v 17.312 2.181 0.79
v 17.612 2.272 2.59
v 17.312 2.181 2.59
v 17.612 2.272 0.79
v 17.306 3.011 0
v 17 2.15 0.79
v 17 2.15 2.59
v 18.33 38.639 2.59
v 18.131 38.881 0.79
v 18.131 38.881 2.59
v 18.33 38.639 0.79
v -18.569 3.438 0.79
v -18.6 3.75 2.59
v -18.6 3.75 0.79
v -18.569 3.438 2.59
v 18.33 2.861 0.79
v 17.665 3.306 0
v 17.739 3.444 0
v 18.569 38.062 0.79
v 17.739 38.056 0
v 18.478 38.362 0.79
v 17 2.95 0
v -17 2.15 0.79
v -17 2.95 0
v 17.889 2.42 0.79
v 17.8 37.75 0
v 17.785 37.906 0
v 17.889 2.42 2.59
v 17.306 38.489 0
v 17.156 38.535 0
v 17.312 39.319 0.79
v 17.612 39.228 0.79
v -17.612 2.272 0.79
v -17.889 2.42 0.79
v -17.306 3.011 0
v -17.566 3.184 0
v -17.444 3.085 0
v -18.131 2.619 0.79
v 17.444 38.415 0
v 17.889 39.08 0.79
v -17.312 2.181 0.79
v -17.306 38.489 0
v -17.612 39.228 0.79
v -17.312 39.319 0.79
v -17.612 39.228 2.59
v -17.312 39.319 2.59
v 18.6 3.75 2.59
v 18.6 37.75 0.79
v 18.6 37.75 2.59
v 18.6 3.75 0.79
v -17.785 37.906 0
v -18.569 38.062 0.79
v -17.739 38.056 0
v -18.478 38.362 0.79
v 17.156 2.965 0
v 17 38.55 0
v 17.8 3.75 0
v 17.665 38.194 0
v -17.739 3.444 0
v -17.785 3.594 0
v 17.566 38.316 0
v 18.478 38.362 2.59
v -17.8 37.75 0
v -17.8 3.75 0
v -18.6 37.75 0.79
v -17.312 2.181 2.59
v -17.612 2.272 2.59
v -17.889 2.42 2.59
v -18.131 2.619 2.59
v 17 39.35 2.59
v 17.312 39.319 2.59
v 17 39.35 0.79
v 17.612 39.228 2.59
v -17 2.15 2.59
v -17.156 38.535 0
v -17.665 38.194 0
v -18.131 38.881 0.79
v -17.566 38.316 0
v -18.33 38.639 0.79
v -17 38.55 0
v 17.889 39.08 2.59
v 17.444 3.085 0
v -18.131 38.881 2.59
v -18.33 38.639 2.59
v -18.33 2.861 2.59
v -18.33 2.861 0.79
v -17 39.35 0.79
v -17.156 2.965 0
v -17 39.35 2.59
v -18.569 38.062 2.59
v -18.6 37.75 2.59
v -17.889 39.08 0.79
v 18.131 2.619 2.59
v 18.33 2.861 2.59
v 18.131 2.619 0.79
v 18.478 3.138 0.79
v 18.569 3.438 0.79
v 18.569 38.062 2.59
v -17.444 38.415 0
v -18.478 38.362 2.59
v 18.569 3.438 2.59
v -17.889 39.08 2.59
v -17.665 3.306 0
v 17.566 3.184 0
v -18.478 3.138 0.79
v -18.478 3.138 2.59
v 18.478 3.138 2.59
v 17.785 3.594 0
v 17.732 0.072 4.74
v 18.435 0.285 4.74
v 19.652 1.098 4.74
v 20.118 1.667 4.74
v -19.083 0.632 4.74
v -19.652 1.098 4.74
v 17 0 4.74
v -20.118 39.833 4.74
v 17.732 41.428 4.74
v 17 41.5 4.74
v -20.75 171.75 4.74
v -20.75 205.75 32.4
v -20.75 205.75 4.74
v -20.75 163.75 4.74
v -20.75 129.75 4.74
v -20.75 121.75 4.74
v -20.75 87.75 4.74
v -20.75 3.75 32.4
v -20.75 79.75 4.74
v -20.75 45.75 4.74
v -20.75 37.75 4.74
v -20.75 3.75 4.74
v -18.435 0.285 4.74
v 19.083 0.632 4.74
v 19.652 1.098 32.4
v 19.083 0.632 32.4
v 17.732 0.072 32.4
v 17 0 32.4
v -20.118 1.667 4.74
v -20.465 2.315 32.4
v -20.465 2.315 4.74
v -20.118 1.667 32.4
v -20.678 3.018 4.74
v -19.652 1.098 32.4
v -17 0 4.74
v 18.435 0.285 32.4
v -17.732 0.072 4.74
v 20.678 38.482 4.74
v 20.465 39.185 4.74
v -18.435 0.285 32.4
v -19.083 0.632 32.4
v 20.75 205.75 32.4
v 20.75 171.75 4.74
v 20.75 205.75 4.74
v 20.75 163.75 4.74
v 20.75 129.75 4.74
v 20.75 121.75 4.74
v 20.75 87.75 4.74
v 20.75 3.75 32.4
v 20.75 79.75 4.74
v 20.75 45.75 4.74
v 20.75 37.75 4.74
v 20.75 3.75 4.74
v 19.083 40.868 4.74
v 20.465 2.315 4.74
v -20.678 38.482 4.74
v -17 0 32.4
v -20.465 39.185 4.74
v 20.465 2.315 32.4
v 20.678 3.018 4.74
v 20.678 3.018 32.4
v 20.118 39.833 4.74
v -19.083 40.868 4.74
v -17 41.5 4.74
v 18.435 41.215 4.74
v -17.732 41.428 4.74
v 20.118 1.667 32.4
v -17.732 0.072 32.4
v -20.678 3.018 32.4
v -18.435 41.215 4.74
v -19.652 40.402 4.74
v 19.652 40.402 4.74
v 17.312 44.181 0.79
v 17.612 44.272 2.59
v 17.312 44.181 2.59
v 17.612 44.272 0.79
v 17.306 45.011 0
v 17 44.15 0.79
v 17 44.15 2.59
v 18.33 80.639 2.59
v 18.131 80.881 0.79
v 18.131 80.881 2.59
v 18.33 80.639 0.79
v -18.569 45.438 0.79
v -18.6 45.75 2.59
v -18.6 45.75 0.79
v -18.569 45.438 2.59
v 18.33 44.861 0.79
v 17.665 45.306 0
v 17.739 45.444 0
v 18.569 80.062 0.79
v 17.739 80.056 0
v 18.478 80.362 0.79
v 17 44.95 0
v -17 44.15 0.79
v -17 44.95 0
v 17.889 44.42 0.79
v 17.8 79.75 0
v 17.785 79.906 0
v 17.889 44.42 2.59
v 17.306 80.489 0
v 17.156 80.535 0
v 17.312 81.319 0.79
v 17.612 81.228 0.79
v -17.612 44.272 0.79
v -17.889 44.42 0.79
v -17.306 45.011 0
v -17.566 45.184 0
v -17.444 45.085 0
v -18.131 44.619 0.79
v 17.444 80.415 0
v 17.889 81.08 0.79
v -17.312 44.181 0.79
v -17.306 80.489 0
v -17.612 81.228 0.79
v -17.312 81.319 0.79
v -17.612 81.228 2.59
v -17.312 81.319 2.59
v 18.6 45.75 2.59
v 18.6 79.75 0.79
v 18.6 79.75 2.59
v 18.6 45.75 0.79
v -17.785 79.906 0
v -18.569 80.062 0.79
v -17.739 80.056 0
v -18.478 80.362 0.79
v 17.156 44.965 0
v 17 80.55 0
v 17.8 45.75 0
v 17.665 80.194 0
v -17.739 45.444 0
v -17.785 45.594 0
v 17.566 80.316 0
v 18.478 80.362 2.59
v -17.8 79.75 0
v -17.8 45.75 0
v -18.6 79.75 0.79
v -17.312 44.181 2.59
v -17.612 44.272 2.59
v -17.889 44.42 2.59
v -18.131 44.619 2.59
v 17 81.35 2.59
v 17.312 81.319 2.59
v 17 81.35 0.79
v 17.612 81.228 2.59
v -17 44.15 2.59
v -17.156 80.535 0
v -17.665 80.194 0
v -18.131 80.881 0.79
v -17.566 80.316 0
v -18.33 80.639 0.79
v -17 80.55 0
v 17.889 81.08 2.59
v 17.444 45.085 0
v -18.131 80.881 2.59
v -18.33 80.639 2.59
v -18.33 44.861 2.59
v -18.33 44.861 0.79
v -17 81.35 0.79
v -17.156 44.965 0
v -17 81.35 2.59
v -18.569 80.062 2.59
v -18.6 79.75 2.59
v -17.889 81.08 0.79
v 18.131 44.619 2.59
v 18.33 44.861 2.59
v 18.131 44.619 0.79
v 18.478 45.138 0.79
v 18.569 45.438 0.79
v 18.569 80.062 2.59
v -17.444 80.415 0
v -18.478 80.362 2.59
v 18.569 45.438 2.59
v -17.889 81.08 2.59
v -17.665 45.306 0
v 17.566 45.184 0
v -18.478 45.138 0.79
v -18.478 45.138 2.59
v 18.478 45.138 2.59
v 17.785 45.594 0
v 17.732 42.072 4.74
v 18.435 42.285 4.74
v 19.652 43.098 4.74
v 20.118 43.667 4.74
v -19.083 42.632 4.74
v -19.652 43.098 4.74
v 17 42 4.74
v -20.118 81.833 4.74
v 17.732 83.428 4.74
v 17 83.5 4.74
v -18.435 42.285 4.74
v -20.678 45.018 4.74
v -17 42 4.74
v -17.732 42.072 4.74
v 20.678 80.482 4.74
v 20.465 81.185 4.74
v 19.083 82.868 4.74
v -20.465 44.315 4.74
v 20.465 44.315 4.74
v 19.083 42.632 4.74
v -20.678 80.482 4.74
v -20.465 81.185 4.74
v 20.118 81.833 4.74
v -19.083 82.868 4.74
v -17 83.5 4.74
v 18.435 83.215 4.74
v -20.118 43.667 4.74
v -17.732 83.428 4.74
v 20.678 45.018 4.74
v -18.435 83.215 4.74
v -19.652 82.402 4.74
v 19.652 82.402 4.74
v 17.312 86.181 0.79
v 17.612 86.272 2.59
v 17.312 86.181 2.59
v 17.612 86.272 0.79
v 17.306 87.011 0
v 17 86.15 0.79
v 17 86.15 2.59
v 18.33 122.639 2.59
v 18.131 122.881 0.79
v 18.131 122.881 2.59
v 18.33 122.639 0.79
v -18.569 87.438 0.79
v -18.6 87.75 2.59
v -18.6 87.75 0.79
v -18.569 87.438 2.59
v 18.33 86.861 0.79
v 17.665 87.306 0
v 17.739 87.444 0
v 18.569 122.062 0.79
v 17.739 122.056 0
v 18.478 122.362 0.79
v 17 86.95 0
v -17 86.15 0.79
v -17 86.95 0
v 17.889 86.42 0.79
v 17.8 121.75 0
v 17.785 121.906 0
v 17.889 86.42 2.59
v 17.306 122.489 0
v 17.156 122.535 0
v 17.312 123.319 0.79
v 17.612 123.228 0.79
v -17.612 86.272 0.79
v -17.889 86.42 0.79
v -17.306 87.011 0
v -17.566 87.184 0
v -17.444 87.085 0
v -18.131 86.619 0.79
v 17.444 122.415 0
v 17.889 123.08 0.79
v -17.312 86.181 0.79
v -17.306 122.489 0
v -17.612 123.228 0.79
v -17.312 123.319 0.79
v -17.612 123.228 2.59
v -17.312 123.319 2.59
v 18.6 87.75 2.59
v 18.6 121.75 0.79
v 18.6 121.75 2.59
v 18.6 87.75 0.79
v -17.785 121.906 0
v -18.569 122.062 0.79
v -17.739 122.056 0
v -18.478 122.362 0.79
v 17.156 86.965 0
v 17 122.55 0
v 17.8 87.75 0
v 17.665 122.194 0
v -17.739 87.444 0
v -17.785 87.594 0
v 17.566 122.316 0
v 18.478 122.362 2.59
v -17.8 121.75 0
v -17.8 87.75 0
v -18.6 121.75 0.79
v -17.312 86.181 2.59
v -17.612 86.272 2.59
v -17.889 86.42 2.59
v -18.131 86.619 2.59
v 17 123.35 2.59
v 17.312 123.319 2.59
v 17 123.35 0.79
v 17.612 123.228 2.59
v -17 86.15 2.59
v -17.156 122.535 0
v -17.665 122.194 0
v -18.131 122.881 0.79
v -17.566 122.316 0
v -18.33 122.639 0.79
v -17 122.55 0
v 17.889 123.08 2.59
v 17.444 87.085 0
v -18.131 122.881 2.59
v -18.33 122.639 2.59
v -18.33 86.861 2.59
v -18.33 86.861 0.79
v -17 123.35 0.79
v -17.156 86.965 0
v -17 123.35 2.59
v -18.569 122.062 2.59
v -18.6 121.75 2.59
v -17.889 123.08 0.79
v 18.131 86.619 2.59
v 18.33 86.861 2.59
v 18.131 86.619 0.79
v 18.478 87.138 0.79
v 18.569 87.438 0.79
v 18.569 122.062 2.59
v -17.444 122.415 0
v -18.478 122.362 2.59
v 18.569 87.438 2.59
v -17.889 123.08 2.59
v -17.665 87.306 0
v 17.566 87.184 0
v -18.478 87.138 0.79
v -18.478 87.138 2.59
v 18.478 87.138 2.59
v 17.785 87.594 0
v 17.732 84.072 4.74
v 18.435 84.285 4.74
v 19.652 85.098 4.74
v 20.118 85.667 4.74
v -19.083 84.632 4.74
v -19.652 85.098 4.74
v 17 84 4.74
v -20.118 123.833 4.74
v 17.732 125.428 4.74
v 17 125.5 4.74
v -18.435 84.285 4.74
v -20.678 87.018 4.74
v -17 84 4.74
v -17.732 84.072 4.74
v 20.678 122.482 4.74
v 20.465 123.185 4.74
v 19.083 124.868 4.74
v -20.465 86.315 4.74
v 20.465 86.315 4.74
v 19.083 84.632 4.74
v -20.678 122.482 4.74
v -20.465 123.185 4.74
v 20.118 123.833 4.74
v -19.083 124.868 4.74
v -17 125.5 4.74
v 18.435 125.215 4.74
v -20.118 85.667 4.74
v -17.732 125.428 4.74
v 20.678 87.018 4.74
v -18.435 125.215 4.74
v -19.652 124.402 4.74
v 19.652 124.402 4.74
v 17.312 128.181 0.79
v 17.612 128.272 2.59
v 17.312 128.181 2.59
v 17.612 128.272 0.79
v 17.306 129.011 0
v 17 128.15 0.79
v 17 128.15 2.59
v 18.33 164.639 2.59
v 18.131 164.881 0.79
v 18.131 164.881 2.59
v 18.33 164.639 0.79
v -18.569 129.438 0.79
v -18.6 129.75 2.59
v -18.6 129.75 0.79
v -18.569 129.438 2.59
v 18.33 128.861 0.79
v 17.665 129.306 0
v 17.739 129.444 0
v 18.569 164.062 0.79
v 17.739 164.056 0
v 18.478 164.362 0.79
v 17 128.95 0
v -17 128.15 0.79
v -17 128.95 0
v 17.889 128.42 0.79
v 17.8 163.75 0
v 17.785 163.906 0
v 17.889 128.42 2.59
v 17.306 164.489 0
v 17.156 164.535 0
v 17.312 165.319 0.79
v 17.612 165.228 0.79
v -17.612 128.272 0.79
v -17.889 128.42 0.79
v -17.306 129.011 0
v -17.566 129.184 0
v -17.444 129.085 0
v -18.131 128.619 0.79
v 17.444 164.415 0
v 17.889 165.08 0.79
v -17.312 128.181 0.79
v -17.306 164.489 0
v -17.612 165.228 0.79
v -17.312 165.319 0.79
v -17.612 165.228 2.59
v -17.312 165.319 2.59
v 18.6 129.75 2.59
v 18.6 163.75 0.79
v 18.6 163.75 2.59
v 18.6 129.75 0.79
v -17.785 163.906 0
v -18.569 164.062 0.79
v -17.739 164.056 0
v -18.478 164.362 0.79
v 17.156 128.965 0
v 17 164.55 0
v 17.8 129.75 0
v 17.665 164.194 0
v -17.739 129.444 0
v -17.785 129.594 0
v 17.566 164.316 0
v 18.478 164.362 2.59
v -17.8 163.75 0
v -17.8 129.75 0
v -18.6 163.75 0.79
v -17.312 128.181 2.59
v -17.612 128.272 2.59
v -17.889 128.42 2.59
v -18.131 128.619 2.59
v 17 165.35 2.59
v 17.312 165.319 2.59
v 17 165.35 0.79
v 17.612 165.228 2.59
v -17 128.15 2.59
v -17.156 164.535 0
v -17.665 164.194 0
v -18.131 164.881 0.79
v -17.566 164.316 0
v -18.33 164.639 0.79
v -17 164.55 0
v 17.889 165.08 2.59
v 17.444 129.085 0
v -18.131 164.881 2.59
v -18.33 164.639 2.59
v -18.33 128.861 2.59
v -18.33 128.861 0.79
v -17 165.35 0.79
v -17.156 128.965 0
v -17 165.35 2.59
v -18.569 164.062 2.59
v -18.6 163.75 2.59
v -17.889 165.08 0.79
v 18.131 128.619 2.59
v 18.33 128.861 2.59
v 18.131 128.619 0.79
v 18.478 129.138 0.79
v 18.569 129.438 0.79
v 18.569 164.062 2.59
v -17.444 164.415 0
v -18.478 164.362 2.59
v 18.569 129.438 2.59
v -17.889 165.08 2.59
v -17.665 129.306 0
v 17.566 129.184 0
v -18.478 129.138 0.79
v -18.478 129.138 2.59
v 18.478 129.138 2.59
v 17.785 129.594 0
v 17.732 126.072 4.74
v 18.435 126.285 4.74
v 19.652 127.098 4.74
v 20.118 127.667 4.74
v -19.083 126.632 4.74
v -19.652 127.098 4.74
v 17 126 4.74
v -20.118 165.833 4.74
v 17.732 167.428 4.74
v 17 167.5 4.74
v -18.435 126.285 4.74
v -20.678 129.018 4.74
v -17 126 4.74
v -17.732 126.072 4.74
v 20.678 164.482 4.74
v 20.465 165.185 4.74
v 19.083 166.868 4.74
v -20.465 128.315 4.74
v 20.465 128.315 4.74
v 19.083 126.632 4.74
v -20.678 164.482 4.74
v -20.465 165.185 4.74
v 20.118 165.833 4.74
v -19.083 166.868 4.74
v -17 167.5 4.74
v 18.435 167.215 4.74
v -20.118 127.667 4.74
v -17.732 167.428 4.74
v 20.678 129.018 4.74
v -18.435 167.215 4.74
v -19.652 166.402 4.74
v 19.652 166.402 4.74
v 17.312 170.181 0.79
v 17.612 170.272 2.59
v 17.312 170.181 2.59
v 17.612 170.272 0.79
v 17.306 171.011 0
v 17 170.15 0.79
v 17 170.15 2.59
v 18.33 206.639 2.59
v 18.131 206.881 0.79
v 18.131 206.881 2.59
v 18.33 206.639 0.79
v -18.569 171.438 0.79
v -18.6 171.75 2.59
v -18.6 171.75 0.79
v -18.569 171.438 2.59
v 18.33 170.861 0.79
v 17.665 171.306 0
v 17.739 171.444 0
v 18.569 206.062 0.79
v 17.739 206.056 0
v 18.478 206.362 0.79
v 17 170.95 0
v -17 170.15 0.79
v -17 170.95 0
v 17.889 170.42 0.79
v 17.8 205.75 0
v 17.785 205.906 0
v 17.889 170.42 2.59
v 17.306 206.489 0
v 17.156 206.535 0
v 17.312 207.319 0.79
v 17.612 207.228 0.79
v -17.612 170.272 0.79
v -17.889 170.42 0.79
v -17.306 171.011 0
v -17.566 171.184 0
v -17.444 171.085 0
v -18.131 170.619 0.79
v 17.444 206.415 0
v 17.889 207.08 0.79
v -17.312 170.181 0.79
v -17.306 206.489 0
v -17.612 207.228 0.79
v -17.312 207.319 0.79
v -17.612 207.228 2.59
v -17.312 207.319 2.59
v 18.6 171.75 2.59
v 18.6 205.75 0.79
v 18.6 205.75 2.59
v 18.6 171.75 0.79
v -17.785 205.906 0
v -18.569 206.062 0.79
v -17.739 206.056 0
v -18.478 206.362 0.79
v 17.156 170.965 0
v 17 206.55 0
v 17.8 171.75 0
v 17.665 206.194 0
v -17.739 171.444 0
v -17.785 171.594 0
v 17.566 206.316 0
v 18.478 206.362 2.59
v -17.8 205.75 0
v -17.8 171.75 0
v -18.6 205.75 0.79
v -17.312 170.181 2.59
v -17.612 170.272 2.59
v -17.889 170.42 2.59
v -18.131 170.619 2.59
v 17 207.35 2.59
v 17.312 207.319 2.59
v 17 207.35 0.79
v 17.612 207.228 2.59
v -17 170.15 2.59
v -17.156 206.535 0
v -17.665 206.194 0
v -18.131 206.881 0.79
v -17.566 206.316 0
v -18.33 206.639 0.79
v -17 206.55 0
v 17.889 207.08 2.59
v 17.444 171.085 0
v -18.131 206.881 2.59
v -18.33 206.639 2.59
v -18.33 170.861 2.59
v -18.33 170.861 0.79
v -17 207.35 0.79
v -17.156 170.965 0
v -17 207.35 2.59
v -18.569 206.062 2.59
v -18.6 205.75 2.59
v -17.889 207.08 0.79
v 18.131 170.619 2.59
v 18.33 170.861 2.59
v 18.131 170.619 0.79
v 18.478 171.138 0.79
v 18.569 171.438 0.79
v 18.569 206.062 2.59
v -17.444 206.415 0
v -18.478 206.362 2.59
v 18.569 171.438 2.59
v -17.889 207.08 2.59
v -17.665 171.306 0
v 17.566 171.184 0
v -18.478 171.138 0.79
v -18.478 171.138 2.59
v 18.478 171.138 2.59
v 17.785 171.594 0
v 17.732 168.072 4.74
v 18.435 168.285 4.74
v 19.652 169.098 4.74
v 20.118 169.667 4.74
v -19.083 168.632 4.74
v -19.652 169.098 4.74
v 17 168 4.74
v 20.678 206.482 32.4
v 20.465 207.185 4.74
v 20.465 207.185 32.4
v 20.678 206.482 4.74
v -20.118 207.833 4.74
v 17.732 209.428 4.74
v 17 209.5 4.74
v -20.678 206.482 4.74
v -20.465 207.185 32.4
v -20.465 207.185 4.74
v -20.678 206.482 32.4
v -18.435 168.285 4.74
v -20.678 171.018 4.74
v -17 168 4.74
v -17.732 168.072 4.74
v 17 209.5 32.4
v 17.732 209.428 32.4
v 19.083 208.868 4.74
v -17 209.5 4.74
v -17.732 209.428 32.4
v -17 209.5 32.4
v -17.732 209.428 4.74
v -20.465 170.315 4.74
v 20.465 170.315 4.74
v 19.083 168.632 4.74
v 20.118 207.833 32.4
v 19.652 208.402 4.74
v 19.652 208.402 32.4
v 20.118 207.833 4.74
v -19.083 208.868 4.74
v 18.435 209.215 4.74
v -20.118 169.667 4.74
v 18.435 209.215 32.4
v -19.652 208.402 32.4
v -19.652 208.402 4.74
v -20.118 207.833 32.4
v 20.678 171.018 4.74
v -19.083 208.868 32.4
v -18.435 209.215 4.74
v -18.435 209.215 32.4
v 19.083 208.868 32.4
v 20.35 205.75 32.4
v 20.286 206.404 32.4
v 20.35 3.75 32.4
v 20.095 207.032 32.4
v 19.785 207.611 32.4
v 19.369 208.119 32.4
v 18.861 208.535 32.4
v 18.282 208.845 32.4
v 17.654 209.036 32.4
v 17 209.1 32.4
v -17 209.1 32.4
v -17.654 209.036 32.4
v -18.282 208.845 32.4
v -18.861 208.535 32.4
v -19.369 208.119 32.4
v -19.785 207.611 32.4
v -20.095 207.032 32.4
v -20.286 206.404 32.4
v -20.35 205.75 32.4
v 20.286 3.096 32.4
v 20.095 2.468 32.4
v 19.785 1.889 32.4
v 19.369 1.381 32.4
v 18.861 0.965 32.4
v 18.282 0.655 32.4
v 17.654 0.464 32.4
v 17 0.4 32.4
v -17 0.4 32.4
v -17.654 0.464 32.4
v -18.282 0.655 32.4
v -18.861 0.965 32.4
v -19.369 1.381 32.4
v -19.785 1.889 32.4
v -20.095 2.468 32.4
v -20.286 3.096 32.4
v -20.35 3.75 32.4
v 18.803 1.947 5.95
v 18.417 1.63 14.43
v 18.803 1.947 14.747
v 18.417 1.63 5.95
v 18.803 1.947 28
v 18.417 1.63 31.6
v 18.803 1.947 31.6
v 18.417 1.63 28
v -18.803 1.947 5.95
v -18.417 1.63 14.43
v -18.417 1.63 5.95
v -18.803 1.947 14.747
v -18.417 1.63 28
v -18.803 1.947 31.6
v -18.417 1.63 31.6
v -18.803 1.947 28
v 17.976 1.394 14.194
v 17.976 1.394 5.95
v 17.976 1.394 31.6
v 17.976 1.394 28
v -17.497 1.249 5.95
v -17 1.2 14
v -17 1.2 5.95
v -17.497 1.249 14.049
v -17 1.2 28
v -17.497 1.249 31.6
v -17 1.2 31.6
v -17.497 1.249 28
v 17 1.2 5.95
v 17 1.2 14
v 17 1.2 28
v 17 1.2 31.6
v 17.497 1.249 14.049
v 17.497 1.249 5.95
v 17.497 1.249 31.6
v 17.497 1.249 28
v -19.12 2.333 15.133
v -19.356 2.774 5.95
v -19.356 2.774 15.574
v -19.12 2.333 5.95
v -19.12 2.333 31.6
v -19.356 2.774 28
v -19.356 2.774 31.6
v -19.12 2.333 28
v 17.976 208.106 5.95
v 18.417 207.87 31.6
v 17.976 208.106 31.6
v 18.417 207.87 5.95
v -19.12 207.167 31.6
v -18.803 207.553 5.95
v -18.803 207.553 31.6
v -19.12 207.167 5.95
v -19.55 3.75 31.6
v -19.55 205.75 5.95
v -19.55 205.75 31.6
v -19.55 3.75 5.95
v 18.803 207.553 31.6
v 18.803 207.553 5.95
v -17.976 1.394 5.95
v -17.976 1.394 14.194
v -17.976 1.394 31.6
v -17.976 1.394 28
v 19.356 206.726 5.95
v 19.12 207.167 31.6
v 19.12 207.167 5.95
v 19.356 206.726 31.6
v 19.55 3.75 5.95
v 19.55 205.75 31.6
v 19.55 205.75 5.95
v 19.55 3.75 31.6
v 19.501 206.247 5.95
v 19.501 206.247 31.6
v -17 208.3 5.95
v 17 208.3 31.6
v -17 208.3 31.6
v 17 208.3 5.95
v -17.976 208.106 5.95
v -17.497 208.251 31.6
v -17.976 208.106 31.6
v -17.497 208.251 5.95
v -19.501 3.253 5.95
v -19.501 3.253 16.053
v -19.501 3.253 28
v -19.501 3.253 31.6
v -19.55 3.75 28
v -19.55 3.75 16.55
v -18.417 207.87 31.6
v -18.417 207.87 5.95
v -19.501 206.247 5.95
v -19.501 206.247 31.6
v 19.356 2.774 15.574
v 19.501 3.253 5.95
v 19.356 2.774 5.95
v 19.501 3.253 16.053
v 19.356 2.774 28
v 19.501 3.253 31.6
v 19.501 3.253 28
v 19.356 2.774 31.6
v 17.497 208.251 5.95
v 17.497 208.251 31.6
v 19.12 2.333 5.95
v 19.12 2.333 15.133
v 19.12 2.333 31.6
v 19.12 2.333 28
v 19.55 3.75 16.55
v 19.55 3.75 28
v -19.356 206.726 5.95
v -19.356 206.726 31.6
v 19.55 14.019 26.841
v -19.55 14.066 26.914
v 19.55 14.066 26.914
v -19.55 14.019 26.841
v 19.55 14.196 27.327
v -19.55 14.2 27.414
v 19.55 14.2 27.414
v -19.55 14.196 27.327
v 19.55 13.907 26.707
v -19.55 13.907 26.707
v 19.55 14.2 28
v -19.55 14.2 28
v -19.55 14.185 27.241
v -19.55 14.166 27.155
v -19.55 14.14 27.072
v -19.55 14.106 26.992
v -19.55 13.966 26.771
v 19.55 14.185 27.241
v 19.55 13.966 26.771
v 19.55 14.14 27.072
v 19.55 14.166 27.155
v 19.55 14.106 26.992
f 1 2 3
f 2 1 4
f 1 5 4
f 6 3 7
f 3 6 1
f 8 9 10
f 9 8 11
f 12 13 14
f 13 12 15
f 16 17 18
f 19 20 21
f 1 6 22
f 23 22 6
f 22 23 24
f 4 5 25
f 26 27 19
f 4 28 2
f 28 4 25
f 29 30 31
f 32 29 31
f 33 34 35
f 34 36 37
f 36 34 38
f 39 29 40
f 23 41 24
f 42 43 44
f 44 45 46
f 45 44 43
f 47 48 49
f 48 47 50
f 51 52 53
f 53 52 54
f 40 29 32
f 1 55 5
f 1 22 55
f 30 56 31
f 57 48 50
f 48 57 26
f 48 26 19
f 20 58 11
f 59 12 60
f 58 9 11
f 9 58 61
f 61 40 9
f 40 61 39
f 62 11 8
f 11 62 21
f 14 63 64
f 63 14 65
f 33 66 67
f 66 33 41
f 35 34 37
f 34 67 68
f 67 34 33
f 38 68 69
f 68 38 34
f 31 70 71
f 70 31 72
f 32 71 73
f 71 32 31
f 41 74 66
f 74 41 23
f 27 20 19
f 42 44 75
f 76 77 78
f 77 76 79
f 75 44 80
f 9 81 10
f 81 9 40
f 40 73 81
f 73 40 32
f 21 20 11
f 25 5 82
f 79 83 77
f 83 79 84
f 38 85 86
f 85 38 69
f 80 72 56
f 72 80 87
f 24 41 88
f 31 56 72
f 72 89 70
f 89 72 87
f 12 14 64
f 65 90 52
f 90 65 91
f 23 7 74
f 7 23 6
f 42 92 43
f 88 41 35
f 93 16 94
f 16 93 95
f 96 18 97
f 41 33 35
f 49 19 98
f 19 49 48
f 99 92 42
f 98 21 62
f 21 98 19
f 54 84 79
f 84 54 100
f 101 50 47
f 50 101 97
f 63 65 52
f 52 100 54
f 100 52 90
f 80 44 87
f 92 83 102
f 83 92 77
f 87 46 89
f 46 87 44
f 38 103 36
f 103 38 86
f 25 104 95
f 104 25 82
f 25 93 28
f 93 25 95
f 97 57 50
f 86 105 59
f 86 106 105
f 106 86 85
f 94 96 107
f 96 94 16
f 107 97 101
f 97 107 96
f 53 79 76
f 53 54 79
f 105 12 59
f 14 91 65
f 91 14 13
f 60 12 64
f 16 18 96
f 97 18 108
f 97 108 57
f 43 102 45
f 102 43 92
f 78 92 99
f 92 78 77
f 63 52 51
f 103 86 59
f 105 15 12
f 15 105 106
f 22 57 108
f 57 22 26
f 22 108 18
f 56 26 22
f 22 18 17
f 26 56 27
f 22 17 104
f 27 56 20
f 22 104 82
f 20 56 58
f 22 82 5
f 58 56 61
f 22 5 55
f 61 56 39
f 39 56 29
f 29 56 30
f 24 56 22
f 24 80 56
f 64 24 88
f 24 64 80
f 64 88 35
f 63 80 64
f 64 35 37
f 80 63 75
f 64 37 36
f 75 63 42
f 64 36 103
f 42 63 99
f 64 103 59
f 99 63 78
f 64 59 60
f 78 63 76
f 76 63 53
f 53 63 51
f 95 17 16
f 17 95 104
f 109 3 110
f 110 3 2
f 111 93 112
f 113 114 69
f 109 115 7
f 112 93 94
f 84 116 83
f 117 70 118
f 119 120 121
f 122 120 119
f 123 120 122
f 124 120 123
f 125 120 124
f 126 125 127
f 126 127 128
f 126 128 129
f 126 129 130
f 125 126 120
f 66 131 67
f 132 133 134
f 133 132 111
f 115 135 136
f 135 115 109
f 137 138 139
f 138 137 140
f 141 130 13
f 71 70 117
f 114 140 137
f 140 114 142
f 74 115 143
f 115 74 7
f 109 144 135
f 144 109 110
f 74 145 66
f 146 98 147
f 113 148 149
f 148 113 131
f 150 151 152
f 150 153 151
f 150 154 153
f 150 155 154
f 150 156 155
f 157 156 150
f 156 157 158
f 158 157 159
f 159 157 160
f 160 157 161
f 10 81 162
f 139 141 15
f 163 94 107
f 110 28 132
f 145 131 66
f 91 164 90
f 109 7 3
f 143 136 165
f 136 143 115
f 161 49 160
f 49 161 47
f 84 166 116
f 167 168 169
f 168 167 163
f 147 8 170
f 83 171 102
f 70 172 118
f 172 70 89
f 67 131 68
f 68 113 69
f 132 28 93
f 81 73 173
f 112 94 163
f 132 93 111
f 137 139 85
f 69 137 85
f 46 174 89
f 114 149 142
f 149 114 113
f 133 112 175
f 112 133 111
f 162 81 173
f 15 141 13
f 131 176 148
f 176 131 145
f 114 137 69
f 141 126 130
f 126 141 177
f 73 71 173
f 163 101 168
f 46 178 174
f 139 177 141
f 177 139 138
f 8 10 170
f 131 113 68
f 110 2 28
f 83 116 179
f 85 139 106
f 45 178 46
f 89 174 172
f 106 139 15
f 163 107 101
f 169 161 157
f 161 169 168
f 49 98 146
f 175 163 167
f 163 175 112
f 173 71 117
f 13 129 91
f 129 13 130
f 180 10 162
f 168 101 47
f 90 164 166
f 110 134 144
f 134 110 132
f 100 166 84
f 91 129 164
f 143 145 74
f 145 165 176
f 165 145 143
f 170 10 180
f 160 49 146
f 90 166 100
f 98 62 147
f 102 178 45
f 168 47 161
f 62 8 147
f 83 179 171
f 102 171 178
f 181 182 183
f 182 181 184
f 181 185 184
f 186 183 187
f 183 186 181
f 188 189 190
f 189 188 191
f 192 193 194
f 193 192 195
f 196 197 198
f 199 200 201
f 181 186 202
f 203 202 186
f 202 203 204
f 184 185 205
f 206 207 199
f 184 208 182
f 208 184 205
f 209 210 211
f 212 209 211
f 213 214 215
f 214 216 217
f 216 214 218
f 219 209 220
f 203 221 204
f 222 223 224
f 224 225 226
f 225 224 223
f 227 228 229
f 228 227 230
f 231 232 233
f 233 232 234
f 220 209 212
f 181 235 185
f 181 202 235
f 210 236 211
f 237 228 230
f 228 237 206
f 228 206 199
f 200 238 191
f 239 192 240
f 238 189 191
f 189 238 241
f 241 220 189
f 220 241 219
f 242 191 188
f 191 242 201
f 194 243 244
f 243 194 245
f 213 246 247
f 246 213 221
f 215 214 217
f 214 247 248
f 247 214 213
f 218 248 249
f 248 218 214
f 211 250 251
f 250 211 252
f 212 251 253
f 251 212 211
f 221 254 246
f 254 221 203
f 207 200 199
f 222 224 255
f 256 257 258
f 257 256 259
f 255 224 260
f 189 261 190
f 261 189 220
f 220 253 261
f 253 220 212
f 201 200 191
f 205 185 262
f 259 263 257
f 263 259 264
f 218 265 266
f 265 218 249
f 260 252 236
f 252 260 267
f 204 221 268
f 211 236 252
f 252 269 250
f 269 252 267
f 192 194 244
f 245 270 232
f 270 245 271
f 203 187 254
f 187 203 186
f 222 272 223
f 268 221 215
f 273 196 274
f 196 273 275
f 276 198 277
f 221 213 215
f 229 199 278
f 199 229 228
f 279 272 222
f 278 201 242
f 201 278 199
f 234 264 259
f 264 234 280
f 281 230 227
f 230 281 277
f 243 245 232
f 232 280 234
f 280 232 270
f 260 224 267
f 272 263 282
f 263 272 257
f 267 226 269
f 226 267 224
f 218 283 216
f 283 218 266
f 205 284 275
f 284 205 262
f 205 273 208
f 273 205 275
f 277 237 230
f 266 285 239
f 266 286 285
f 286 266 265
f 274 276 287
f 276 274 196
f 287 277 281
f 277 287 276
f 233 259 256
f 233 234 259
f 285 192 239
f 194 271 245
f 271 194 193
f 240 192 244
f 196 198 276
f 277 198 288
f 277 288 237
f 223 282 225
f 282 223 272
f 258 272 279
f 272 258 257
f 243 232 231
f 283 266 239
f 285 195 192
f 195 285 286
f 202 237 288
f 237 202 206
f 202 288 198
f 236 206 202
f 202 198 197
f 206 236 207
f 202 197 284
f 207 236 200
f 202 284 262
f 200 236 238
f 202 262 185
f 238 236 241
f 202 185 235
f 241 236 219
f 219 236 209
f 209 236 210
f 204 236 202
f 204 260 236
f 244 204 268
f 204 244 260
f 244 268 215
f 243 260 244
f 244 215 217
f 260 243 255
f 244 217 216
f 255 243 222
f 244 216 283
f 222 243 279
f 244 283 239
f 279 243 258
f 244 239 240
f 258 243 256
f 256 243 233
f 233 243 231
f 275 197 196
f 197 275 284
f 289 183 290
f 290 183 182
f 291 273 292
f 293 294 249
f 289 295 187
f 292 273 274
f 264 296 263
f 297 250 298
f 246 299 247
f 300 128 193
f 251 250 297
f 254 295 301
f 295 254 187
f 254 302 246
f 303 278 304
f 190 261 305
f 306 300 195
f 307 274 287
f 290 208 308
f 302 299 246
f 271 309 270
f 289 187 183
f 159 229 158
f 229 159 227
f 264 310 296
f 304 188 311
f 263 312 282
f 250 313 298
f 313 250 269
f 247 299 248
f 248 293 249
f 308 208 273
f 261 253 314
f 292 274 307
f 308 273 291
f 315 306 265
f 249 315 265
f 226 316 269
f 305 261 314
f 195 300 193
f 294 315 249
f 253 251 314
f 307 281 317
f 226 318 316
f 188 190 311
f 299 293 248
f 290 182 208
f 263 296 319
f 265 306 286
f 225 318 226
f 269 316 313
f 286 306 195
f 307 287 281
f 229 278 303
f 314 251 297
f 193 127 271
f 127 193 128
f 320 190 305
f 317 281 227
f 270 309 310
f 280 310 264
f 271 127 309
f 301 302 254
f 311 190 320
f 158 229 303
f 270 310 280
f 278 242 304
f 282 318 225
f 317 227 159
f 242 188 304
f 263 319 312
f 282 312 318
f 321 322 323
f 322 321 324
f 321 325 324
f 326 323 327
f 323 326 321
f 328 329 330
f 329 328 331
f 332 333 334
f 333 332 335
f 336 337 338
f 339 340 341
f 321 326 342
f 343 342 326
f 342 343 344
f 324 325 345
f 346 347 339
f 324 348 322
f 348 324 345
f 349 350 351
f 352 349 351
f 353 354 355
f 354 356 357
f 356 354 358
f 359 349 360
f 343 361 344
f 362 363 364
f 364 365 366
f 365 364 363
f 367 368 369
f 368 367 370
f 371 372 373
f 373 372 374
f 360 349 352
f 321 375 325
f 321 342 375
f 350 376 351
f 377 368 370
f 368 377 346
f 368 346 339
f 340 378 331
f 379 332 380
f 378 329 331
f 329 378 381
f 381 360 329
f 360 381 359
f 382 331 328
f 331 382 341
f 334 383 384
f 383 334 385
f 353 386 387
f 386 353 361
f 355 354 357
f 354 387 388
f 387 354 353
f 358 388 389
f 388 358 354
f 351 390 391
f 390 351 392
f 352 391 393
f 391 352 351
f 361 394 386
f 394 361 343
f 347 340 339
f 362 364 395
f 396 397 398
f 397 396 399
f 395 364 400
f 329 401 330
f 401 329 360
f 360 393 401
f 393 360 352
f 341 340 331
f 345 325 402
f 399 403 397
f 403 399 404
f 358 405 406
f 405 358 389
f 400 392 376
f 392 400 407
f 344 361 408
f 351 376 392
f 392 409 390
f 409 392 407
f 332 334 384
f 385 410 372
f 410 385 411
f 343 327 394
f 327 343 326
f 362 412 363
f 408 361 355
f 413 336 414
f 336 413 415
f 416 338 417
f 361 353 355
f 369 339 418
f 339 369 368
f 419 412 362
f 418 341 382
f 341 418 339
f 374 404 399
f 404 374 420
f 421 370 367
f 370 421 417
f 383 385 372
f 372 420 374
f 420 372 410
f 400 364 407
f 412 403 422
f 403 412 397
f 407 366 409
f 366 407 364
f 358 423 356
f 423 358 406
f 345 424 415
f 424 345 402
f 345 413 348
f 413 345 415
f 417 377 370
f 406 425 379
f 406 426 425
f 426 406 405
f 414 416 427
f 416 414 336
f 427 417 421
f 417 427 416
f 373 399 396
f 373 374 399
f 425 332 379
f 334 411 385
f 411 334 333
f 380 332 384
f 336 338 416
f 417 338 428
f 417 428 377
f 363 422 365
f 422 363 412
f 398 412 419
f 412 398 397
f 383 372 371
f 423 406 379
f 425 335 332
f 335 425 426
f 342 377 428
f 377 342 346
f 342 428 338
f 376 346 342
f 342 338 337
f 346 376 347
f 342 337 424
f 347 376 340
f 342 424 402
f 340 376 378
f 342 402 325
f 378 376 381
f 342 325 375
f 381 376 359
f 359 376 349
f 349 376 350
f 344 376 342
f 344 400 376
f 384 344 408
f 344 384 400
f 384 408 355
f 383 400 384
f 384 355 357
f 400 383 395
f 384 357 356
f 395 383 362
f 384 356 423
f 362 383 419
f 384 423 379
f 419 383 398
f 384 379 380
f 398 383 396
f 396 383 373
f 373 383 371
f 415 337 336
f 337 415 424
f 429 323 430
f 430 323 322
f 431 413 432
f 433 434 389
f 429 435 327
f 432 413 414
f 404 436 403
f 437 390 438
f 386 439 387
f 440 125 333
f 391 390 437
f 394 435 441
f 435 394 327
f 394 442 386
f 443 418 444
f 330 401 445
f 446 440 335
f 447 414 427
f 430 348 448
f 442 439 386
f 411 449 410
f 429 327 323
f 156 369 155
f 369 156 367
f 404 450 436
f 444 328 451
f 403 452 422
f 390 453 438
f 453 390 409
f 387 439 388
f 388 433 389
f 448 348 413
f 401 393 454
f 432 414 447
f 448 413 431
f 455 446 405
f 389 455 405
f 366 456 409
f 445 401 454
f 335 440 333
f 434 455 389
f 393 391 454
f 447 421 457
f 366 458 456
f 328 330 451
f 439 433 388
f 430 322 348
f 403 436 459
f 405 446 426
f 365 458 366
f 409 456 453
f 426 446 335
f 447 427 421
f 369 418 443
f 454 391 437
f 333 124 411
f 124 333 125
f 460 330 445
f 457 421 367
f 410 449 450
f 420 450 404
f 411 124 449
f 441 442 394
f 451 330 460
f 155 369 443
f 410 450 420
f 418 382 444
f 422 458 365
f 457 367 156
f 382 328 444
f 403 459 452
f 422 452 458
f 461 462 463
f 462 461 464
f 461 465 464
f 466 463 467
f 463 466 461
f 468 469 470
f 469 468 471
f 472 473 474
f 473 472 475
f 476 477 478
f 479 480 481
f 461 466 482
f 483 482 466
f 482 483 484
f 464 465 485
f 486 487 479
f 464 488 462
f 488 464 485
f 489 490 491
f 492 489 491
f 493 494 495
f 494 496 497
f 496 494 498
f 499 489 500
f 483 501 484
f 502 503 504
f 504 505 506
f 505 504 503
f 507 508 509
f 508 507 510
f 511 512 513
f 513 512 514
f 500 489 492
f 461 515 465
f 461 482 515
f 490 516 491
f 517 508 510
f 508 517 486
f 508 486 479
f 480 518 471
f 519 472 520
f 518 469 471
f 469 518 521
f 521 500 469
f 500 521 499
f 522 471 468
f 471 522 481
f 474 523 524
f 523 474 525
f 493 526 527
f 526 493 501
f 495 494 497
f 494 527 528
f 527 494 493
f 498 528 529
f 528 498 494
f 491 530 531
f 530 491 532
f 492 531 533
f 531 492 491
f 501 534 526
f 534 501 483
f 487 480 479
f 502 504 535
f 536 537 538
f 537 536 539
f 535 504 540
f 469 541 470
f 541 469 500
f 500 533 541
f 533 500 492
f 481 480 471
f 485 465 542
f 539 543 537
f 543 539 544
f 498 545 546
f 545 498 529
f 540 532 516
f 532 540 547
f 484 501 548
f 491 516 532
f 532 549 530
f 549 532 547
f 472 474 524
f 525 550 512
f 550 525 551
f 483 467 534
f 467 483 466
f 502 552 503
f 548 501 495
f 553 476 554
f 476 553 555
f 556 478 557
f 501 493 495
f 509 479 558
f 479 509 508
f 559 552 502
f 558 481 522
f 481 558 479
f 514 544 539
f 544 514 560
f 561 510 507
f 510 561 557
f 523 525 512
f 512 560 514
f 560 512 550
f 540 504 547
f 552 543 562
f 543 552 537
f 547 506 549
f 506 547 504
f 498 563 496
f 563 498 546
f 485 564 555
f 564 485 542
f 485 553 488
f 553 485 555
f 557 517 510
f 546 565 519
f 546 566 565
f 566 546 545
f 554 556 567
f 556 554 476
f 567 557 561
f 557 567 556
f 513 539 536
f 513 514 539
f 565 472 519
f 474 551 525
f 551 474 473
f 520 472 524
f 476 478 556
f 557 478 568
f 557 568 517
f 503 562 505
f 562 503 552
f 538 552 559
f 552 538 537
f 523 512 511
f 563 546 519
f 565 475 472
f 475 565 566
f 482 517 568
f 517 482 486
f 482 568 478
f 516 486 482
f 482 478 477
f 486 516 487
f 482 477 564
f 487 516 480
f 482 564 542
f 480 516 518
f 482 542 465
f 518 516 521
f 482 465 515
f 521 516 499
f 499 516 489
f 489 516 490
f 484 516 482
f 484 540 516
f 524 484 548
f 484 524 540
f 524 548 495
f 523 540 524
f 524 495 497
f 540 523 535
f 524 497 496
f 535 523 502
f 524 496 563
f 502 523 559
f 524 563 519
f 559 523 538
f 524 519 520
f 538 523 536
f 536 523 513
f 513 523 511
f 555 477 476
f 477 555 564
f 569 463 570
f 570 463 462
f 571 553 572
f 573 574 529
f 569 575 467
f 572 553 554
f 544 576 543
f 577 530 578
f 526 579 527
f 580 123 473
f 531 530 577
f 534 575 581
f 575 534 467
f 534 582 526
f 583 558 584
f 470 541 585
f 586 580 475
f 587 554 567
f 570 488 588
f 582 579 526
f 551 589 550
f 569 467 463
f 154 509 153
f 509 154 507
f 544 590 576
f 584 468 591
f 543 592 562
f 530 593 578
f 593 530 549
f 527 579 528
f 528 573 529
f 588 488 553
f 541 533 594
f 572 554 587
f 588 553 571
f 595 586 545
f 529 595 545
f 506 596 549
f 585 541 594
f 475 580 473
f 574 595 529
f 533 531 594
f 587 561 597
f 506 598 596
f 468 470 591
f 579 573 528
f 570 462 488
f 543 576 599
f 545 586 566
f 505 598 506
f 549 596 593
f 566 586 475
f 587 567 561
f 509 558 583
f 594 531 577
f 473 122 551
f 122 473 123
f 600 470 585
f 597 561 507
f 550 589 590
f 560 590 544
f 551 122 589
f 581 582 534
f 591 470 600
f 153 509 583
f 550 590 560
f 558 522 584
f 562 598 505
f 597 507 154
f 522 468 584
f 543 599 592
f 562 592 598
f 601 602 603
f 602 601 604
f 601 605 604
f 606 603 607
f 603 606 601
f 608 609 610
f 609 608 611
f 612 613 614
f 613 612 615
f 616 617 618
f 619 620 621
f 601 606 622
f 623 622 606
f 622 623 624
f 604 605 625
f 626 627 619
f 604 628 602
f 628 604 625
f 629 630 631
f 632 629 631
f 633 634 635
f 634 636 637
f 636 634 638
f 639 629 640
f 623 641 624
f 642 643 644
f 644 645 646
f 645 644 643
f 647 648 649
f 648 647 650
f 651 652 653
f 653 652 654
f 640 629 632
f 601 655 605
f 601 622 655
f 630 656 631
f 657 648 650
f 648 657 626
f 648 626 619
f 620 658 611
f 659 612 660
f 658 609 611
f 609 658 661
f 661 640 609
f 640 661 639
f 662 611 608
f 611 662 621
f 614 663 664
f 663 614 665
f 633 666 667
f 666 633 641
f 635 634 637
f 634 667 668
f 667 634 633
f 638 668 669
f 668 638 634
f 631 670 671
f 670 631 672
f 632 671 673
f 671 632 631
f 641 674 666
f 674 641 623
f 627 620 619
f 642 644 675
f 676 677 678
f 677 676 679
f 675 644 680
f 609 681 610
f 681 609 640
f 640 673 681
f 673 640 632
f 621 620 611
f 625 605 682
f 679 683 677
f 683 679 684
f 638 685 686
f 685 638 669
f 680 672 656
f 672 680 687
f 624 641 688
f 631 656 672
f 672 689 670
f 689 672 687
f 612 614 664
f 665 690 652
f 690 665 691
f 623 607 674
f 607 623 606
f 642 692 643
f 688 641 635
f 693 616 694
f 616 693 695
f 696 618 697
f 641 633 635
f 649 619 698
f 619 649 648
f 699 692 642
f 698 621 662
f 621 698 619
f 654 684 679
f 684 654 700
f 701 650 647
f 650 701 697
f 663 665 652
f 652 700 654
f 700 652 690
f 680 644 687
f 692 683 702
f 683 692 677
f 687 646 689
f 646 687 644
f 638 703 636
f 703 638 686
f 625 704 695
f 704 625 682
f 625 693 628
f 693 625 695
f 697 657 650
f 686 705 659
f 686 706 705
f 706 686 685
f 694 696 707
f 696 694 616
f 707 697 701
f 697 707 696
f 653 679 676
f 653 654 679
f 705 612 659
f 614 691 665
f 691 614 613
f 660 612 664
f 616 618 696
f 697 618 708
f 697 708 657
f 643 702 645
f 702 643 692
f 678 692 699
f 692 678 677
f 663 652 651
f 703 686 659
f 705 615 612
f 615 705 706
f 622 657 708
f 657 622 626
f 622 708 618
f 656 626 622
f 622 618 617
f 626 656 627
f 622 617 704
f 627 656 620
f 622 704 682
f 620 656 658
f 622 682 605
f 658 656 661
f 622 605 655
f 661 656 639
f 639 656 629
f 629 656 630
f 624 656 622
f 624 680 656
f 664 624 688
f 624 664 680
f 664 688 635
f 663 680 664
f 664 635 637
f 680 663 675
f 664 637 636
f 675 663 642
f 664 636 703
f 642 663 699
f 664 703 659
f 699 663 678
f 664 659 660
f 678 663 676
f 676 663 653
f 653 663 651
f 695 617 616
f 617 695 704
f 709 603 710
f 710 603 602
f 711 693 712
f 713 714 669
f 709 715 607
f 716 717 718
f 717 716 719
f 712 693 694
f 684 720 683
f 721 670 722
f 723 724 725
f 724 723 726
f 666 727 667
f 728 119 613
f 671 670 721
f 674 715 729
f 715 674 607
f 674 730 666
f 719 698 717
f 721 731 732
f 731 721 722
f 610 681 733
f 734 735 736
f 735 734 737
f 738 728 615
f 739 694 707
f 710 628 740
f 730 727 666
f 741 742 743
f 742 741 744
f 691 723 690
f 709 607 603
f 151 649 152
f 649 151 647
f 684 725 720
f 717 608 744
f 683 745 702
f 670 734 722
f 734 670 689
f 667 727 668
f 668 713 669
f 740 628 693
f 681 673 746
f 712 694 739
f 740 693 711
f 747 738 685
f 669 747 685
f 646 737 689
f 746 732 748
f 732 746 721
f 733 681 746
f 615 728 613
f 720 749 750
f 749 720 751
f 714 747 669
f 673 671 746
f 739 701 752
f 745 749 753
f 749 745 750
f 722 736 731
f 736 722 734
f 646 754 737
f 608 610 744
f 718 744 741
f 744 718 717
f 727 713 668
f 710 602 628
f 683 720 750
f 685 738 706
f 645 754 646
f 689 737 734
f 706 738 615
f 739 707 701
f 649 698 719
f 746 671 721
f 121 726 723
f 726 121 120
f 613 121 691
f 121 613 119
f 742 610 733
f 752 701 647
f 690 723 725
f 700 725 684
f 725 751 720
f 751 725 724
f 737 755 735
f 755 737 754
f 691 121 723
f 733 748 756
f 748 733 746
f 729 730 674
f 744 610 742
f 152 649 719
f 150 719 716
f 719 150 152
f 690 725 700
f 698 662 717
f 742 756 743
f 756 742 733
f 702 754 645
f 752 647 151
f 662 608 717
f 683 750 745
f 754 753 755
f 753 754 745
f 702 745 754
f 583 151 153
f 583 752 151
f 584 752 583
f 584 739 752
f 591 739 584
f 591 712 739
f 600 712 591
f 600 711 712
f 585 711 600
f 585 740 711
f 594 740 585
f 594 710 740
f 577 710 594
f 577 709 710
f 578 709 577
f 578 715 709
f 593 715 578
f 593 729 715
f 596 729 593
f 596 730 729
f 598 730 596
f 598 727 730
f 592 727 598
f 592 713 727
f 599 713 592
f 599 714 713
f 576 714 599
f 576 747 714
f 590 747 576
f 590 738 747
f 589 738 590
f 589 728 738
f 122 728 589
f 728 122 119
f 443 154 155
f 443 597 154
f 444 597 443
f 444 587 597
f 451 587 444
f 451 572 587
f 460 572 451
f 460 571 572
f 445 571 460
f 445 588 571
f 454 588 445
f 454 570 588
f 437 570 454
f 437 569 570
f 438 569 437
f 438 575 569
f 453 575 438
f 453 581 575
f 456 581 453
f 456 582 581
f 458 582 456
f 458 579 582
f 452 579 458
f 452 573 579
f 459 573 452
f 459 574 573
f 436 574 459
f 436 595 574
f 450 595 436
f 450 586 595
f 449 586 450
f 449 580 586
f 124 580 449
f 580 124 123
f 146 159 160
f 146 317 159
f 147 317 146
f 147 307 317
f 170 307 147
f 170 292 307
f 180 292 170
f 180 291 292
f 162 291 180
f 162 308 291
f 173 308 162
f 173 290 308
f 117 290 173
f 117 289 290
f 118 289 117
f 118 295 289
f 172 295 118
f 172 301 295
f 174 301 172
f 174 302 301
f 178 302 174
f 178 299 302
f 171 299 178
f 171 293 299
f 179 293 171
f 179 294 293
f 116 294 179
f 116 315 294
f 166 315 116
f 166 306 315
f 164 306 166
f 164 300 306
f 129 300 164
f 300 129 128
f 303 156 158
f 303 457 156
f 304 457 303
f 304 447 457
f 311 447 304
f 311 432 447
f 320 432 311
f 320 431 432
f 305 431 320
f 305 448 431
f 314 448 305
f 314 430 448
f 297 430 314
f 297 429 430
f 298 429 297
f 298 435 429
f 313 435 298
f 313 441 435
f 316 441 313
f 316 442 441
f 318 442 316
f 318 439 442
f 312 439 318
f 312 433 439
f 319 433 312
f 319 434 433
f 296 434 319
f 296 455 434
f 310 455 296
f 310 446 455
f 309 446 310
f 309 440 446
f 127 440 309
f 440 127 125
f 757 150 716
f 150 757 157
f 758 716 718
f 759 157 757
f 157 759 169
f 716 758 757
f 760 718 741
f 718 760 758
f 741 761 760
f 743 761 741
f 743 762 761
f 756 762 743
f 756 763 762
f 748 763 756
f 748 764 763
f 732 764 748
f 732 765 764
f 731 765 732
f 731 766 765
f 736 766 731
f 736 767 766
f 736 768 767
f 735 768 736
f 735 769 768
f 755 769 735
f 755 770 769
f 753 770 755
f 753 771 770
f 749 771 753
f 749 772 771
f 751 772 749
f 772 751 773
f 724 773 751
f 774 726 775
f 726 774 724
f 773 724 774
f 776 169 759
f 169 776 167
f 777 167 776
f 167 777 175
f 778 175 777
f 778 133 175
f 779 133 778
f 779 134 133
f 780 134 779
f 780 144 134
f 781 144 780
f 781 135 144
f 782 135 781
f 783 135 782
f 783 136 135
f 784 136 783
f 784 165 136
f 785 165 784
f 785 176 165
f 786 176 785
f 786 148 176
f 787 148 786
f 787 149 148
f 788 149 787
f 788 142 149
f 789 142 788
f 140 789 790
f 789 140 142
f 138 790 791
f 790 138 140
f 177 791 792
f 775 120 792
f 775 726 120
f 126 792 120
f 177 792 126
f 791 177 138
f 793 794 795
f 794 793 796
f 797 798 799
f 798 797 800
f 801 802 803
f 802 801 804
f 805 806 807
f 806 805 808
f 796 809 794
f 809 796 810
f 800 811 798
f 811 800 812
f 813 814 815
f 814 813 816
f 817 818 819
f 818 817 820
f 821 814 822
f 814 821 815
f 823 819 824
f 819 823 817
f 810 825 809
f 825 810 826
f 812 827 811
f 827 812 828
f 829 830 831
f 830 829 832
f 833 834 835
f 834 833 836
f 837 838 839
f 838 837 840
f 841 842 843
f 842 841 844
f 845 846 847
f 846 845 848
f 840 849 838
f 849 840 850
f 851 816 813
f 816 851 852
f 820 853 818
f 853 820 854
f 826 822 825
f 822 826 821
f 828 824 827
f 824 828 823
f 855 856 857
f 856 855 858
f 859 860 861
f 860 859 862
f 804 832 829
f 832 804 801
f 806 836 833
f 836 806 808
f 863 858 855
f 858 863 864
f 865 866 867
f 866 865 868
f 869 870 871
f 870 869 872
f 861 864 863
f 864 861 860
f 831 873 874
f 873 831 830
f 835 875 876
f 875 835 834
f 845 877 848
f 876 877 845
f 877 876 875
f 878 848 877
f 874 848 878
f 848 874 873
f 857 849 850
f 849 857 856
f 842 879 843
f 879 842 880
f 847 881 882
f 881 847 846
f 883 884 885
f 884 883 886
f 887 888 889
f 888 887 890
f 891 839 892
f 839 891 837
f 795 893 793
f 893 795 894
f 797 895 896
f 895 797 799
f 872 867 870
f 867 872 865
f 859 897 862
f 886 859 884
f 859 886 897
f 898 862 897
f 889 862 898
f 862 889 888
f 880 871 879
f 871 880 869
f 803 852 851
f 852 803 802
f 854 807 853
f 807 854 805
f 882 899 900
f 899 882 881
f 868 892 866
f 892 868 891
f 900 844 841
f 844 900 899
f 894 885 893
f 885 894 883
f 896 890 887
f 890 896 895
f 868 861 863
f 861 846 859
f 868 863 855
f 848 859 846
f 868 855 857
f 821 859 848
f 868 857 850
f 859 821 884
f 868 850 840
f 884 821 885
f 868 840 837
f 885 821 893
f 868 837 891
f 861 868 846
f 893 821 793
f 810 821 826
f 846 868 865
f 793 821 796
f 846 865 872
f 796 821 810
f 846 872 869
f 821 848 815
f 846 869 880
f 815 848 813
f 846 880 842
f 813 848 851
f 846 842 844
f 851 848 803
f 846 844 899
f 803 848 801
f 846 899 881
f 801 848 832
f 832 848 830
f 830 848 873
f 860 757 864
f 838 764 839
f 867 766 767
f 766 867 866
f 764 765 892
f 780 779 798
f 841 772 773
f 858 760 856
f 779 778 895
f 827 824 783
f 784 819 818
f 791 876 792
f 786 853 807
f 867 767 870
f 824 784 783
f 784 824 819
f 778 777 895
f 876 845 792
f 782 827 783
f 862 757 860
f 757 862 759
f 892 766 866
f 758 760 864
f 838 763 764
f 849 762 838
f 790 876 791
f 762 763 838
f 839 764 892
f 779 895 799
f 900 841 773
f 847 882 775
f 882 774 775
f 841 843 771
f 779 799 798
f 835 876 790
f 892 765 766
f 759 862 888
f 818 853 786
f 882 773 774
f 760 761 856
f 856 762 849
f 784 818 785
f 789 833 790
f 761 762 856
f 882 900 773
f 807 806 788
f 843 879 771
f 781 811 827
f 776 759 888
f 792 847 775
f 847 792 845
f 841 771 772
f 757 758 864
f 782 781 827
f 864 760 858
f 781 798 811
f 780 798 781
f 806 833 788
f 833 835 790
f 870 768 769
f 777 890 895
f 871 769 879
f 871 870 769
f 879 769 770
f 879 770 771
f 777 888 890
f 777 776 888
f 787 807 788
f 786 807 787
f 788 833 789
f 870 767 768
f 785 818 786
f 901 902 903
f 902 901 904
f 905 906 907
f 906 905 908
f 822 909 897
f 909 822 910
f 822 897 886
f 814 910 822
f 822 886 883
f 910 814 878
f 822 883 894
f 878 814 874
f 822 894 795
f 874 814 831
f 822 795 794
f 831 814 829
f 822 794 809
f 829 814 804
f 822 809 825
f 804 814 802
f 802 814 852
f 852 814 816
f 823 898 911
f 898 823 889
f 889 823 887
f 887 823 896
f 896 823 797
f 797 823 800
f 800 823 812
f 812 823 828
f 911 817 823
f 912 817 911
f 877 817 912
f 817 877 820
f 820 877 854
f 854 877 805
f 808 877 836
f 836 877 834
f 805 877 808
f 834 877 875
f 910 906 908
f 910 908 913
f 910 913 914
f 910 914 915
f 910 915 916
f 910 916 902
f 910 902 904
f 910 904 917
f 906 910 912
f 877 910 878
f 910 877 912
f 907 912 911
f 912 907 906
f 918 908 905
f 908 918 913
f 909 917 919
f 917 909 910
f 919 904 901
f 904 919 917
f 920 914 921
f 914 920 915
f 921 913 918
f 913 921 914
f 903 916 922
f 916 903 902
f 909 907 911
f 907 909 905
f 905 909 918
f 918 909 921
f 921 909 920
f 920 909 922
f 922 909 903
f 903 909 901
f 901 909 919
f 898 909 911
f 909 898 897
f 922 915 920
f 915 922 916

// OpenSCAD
// file: ../../modules/gridfinity.scad
// Gridfinity ベースプレートの共有 module。
// 寸法は Gridfinity 仕様 (Zack Freedman) の baseplate 輪郭に従う:
//   ピッチ 42、ソケット上端開口 41.5 (角 R4)、上から 45° 面取り 2.15 →
//   垂直 1.8 (37.2 角・R1.85) → 45° 面取り 0.7 → 底 35.8 角 (R1.15)。
//   ソケット深さ = 2.15 + 1.8 + 0.7 = 4.65。
//
// 座標系: X が列方向 (中央が 0)、Y が行方向 (板の前端が 0)、Z=0 が板の底面。
// 板の外形は grid とは独立に rim で与えるので、grid より大きい板 (縁付き) を
// 作れる。ソケットは rim=[left, right, front, back] の内側へ 42 ピッチで並ぶ。

gf_pitch = 42;
gf_socket_top = 41.5; // 上端開口
gf_socket_mid = 37.2; // 垂直部
gf_socket_bot = 35.8; // 底
gf_socket_r_top = 4;
gf_socket_r_mid = 1.85;
gf_socket_r_bot = 1.15;
gf_chamfer_top = 2.15;
gf_wall_h = 1.8;
gf_chamfer_bot = 0.7;
gf_socket_depth = gf_chamfer_top + gf_wall_h + gf_chamfer_bot; // 4.65
gf_fn = 32;
gf_eps = 0.01; // hull 用の薄板の厚さ
gf_over = 0.5; // 切削の抜き代

// 角丸正方形 (一辺 w、角 R)
module
gf_rounded_square(w, r)
{
    offset(r = r, $fn = gf_fn) square(w - 2 * r, center = true);
}

// 厚さ gf_eps の角丸正方形の薄板を z に置く (hull の骨)
module
gf_slab(w, r, z)
{
    translate([ 0, 0, z ]) linear_extrude(gf_eps) gf_rounded_square(w, r);
}

// ソケット1個の切削体。z=0 がソケットの底 (床の天面)、+Z へ 4.65 で天面に出る。
// clearance は嵌合の逃げで、輪郭を全周へ clearance だけ外へ出す (幅 +2c、角 R
// +c)。 既定 0 が Gridfinity の公称輪郭。深さとピッチは変えない
module
gf_socket_cut(clearance = 0)
{
    z1 = gf_chamfer_bot;
    z2 = z1 + gf_wall_h;
    z3 = gf_socket_depth;
    c = clearance;
    hull()
    {
        gf_slab(gf_socket_bot + 2 * c, gf_socket_r_bot + c, 0);
        gf_slab(gf_socket_mid + 2 * c, gf_socket_r_mid + c, z1 - gf_eps);
    }
    hull()
    {
        gf_slab(gf_socket_mid + 2 * c, gf_socket_r_mid + c, z1 - gf_eps);
        gf_slab(gf_socket_mid + 2 * c, gf_socket_r_mid + c, z2 - gf_eps);
    }
    hull()
    {
        gf_slab(gf_socket_mid + 2 * c, gf_socket_r_mid + c, z2 - gf_eps);
        gf_slab(gf_socket_top + 2 * c, gf_socket_r_top + c, z3 - gf_eps);
    }
    // 天面より上へ抜く (天面と同一平面の退化した面を残さない)
    gf_slab(gf_socket_top + 2 * c, gf_socket_r_top + c, z3 - gf_eps);
    translate([ 0, 0, z3 - gf_eps ]) linear_extrude(gf_over + gf_eps)
        gf_rounded_square(gf_socket_top + 2 * c, gf_socket_r_top + c);
}

// ベースプレート。cols x rows のソケットを床 floor_t の上に彫る。
// rim = [left, right, front, back] はソケット列の外側に残す縁の幅。
// 板の幅 = cols*42 + left + right、奥行き = rows*42 + front + back。
// clearance はソケットの嵌合の逃げ (gf_socket_cut を参照)。
module
gf_baseplate(cols, rows, rim = [ 0, 0, 0, 0 ], floor_t = 1, clearance = 0)
{
    grid_w = cols * gf_pitch;
    grid_d = rows * gf_pitch;
    plate_w = grid_w + rim[0] + rim[1];
    plate_d = grid_d + rim[2] + rim[3];
    x0 = -plate_w / 2 + rim[0]; // ソケット列の左端
    difference()
    {
        translate([ -plate_w / 2, 0, 0 ])
            cube([ plate_w, plate_d, floor_t + gf_socket_depth ]);
        for (c = [0:cols - 1], r = [0:rows - 1])
            translate([
                x0 + (c + 0.5) * gf_pitch,
                rim[2] + (r + 0.5) * gf_pitch,
                floor_t
            ]) gf_socket_cut(clearance);
    }
}
// file: ../../modules/gridfinity_bin.scad
include <gridfinity.scad>

// Gridfinity bin (箱) の共有 module。ピッチと角丸は gridfinity.scad
// と共有する。 底の輪郭は Gridfinity 仕様の bin base (下から):
//   35.6 角 (R0.8) → 45° 0.8 → 37.2 角 (R1.6) → 垂直 1.8 → 45° 2.15 → 41.5 角
//   (R3.75) 高さ 0.8 + 1.8 + 2.15 = 4.75。磁石穴・ネジ穴は持たない (無垢)
// 外形はピッチ − 0.5 (1 マス 41.5)、角 R3.75。高さ単位 7 (4U = 28 が壁の上端)。
// リップは「薄いリップ」: 壁 (1.2) をそのまま lip_h (4.4) 伸ばし、内側の上端を
// 45° に落とすだけ。内側に棚 (厚い肉) を持たないので、上に載せる bin は底の
// 面取りをこの 45° に座らせる。
//
// 座標系: X が列方向 (中央 0)、Y が行方向 (手前 = ラベル側が 0)、Z=0 が底面。

gfb_outer = gf_pitch - 0.5; // 41.5
gfb_outer_r = 3.75;
gfb_base_bot = 35.6;
gfb_base_bot_r = 0.8;
gfb_base_mid = 37.2;
gfb_base_mid_r = 1.6;
gfb_base_chamfer_bot = 0.8;
gfb_base_wall_h = 1.8;
gfb_base_chamfer_top = 2.15;
gfb_base_h =
    gfb_base_chamfer_bot + gfb_base_wall_h + gfb_base_chamfer_top; // 4.75
gfb_unit = 7;
gfb_lip_h = 4.4;
gfb_lip_chamfer = 0.8;

// bin 1 マスぶんの底 (無垢)。z=0 が底面、gfb_base_h で外形 41.5 角に達する
module
gfb_base_cell()
{
    z1 = gfb_base_chamfer_bot;
    z2 = z1 + gfb_base_wall_h;
    z3 = gfb_base_h;
    hull()
    {
        gf_slab(gfb_base_bot, gfb_base_bot_r, 0);
        gf_slab(gfb_base_mid, gfb_base_mid_r, z1 - gf_eps);
    }
    hull()
    {
        gf_slab(gfb_base_mid, gfb_base_mid_r, z1 - gf_eps);
        gf_slab(gfb_base_mid, gfb_base_mid_r, z2 - gf_eps);
    }
    hull()
    {
        gf_slab(gfb_base_mid, gfb_base_mid_r, z2 - gf_eps);
        gf_slab(gfb_outer, gfb_outer_r, z3 - gf_eps);
    }
}

// cols x rows の角丸矩形 (外形)
module
gfb_footprint(cols, rows, inset = 0)
{
    w = cols * gf_pitch - 0.5 - 2 * inset;
    d = rows * gf_pitch - 0.5 - 2 * inset;
    translate([ 0, d / 2 + inset ])
        gf_rounded_square_wd(w, d, gfb_outer_r - inset);
}

// 幅 w × 奥行き d の角丸矩形 (中心が原点)
module
gf_rounded_square_wd(w, d, r)
{
    offset(r = r, $fn = gf_fn) square([ w - 2 * r, d - 2 * r ], center = true);
}

// ラベル天板の Y-Z 断面 (y = 壁の内面からの距離、z = 高さ)。天板 (厚さ t) の
// 先端から 45° の斜面が壁まで下りる無垢のくさび。先端の垂直面と斜面の境目
// (135°) を半径 r で丸める: 円弧の中心は先端の角から (-r, r·tan22.5°)、接点は
// 垂直面上の角 + (0, r·tan22.5°) と斜面上の角 + 0.4142r·(-1,-1)。壁の内側へ
// 1 だけ食い込ませて胴体と溶かす
function gfb_label_profile(d, t, h, r) =
    let(y0 = d, z0 = h - t, cy = y0 - r, cz = z0 + r * tan(22.5))
        concat([ [ -1, h ], [ d, h ] ],
               [for (a = [0:-5:-45])[cy + r * cos(a), cz + r* sin(a)]],
               [[ -1, h - t - d - 1 ]]);

// bin 本体。units は高さ (U)。wall / floor_t は壁と床の厚さ。
// label_d > 0 なら手前 (y=0) の壁の上端 (z = units*7) と面一で内側へ label_d
// 張り出す厚さ label_t のラベル天板を付ける。天板の下は 45° の無垢のくさびが
// 壁まで下りる (ブリッジもリブも無い。中身はスライサのインフィル任せ)。
// 天板の先端と 45° 面の境目は半径 label_r で丸める
module
gfb_bin(cols,
        rows,
        units = 4,
        wall = 1.2,
        floor_t = 1.2,
        label_d = 0,
        label_t = 1,
        label_r = 1)
{
    h = units * gfb_unit; // 壁の上端
    top = h + gfb_lip_h;  // リップの上端
    inner_w = cols * gf_pitch - 0.5 - 2 * wall;
    floor_top = gfb_base_h + floor_t;
    union()
    {
        // 底: マスごとの無垢の base
        for (c = [0:cols - 1], r = [0:rows - 1])
            translate([
                (c - (cols - 1) / 2) * gf_pitch,
                (r + 0.5) * gf_pitch - 0.25,
                0
            ]) gfb_base_cell();
        // 胴体: base の上から top
        // まで。内側は床の上を抜く。リップの内側の上端は 45°
        difference()
        {
            translate([ 0, 0, gfb_base_h - gf_eps ])
                linear_extrude(top - gfb_base_h + gf_eps)
                    gfb_footprint(cols, rows);
            translate([ 0, 0, floor_top ])
                linear_extrude(top - floor_top + gf_over)
                    gfb_footprint(cols, rows, wall);
            // リップ内側の面取り: 上端で wall − 0.4 まで開く
            hull()
            {
                translate([ 0, 0, top - gfb_lip_chamfer ])
                    linear_extrude(gf_eps) gfb_footprint(cols, rows, wall);
                translate([ 0, 0, top ]) linear_extrude(gf_over)
                    gfb_footprint(cols, rows, wall - gfb_lip_chamfer);
            }
        }
        // ラベル天板と 45° くさび (内幅いっぱい、同じ断面)。壁へ 1 食い込ませた
        // 矩形の柱なので、角の丸み (R3.75) の外へ出ないよう外形で切り取る
        if (label_d > 0)
            intersection()
            {
                translate([ -inner_w / 2, wall, 0 ]) rotate([ 90, 0, 90 ])
                    linear_extrude(inner_w) polygon(
                        gfb_label_profile(label_d, label_t, h, label_r));
                linear_extrude(top) gfb_footprint(cols, rows);
            }
    }
}
// file: ../../modules/gridfinity_bin_4u.scad
include <gridfinity_bin.scad>

// assets/gridfinity-bin/ の bin 群の共通値と、サイズ 3 引数の払い出し口。
// 単体では何も描かない。設計の経緯と確定値は
// ledger/designs/gridfinity-bin-4u.md が正本。 保証する範囲は cols 1..2 ×
// rows 1..5 × units 4 (assets に並ぶ 10 種)。 cols が X (横)、rows が Y
// (ラベルの壁から奥へ)、units が高さ (7mm 単位)。
wall = 1.2;    // 0.4 ノズル 3 本
floor_t = 1.2; // 底 (4.75) の上に載せる床。床の天面 z = 5.95
label_d = 13;  // 12mm 幅のラベルシールを貼る天板の張り出し
label_t = 1; // 天板の厚さ (user 指定)。下は 45° の無垢のくさび
label_r = 1; // 天板の先端と 45° 面の境目の R (user 指定)

function bin_contract(cols, rows, units) = str("CONTRACT units=",
                                               units,
                                               " pitch=",
                                               gf_pitch,
                                               " outer=",
                                               gfb_outer,
                                               " h=",
                                               units* gfb_unit,
                                               " lip=",
                                               gfb_lip_h,
                                               " base=",
                                               gfb_base_bot,
                                               "/",
                                               gfb_base_mid,
                                               "/",
                                               gfb_outer,
                                               " base_h=",
                                               gfb_base_h,
                                               " wall=",
                                               wall,
                                               " floor_top=",
                                               gfb_base_h + floor_t,
                                               " label=",
                                               label_d,
                                               "x",
                                               label_t,
                                               " wedge=45 fillet=",
                                               label_r,
                                               " bin=",
                                               cols,
                                               "x",
                                               rows,
                                               " size=",
                                               cols* gf_pitch - 0.5,
                                               "x",
                                               rows* gf_pitch - 0.5);

// (cols, rows, units) でラベル付き bin を払い出す。例: gridfinity_bin(2, 4, 4)
module
gridfinity_bin(cols, rows, units = 4)
{
    echo(bin_contract(cols, rows, units));
    gfb_bin(cols, rows, units, wall, floor_t, label_d, label_t, label_r);
}
// main file
include <../../modules/gridfinity_bin_4u.scad>

// 1x5 マス、高さ 4U のラベル天板付き bin。ラベルは手前 (y=0) 側
gridfinity_bin(1, 5, 4);
